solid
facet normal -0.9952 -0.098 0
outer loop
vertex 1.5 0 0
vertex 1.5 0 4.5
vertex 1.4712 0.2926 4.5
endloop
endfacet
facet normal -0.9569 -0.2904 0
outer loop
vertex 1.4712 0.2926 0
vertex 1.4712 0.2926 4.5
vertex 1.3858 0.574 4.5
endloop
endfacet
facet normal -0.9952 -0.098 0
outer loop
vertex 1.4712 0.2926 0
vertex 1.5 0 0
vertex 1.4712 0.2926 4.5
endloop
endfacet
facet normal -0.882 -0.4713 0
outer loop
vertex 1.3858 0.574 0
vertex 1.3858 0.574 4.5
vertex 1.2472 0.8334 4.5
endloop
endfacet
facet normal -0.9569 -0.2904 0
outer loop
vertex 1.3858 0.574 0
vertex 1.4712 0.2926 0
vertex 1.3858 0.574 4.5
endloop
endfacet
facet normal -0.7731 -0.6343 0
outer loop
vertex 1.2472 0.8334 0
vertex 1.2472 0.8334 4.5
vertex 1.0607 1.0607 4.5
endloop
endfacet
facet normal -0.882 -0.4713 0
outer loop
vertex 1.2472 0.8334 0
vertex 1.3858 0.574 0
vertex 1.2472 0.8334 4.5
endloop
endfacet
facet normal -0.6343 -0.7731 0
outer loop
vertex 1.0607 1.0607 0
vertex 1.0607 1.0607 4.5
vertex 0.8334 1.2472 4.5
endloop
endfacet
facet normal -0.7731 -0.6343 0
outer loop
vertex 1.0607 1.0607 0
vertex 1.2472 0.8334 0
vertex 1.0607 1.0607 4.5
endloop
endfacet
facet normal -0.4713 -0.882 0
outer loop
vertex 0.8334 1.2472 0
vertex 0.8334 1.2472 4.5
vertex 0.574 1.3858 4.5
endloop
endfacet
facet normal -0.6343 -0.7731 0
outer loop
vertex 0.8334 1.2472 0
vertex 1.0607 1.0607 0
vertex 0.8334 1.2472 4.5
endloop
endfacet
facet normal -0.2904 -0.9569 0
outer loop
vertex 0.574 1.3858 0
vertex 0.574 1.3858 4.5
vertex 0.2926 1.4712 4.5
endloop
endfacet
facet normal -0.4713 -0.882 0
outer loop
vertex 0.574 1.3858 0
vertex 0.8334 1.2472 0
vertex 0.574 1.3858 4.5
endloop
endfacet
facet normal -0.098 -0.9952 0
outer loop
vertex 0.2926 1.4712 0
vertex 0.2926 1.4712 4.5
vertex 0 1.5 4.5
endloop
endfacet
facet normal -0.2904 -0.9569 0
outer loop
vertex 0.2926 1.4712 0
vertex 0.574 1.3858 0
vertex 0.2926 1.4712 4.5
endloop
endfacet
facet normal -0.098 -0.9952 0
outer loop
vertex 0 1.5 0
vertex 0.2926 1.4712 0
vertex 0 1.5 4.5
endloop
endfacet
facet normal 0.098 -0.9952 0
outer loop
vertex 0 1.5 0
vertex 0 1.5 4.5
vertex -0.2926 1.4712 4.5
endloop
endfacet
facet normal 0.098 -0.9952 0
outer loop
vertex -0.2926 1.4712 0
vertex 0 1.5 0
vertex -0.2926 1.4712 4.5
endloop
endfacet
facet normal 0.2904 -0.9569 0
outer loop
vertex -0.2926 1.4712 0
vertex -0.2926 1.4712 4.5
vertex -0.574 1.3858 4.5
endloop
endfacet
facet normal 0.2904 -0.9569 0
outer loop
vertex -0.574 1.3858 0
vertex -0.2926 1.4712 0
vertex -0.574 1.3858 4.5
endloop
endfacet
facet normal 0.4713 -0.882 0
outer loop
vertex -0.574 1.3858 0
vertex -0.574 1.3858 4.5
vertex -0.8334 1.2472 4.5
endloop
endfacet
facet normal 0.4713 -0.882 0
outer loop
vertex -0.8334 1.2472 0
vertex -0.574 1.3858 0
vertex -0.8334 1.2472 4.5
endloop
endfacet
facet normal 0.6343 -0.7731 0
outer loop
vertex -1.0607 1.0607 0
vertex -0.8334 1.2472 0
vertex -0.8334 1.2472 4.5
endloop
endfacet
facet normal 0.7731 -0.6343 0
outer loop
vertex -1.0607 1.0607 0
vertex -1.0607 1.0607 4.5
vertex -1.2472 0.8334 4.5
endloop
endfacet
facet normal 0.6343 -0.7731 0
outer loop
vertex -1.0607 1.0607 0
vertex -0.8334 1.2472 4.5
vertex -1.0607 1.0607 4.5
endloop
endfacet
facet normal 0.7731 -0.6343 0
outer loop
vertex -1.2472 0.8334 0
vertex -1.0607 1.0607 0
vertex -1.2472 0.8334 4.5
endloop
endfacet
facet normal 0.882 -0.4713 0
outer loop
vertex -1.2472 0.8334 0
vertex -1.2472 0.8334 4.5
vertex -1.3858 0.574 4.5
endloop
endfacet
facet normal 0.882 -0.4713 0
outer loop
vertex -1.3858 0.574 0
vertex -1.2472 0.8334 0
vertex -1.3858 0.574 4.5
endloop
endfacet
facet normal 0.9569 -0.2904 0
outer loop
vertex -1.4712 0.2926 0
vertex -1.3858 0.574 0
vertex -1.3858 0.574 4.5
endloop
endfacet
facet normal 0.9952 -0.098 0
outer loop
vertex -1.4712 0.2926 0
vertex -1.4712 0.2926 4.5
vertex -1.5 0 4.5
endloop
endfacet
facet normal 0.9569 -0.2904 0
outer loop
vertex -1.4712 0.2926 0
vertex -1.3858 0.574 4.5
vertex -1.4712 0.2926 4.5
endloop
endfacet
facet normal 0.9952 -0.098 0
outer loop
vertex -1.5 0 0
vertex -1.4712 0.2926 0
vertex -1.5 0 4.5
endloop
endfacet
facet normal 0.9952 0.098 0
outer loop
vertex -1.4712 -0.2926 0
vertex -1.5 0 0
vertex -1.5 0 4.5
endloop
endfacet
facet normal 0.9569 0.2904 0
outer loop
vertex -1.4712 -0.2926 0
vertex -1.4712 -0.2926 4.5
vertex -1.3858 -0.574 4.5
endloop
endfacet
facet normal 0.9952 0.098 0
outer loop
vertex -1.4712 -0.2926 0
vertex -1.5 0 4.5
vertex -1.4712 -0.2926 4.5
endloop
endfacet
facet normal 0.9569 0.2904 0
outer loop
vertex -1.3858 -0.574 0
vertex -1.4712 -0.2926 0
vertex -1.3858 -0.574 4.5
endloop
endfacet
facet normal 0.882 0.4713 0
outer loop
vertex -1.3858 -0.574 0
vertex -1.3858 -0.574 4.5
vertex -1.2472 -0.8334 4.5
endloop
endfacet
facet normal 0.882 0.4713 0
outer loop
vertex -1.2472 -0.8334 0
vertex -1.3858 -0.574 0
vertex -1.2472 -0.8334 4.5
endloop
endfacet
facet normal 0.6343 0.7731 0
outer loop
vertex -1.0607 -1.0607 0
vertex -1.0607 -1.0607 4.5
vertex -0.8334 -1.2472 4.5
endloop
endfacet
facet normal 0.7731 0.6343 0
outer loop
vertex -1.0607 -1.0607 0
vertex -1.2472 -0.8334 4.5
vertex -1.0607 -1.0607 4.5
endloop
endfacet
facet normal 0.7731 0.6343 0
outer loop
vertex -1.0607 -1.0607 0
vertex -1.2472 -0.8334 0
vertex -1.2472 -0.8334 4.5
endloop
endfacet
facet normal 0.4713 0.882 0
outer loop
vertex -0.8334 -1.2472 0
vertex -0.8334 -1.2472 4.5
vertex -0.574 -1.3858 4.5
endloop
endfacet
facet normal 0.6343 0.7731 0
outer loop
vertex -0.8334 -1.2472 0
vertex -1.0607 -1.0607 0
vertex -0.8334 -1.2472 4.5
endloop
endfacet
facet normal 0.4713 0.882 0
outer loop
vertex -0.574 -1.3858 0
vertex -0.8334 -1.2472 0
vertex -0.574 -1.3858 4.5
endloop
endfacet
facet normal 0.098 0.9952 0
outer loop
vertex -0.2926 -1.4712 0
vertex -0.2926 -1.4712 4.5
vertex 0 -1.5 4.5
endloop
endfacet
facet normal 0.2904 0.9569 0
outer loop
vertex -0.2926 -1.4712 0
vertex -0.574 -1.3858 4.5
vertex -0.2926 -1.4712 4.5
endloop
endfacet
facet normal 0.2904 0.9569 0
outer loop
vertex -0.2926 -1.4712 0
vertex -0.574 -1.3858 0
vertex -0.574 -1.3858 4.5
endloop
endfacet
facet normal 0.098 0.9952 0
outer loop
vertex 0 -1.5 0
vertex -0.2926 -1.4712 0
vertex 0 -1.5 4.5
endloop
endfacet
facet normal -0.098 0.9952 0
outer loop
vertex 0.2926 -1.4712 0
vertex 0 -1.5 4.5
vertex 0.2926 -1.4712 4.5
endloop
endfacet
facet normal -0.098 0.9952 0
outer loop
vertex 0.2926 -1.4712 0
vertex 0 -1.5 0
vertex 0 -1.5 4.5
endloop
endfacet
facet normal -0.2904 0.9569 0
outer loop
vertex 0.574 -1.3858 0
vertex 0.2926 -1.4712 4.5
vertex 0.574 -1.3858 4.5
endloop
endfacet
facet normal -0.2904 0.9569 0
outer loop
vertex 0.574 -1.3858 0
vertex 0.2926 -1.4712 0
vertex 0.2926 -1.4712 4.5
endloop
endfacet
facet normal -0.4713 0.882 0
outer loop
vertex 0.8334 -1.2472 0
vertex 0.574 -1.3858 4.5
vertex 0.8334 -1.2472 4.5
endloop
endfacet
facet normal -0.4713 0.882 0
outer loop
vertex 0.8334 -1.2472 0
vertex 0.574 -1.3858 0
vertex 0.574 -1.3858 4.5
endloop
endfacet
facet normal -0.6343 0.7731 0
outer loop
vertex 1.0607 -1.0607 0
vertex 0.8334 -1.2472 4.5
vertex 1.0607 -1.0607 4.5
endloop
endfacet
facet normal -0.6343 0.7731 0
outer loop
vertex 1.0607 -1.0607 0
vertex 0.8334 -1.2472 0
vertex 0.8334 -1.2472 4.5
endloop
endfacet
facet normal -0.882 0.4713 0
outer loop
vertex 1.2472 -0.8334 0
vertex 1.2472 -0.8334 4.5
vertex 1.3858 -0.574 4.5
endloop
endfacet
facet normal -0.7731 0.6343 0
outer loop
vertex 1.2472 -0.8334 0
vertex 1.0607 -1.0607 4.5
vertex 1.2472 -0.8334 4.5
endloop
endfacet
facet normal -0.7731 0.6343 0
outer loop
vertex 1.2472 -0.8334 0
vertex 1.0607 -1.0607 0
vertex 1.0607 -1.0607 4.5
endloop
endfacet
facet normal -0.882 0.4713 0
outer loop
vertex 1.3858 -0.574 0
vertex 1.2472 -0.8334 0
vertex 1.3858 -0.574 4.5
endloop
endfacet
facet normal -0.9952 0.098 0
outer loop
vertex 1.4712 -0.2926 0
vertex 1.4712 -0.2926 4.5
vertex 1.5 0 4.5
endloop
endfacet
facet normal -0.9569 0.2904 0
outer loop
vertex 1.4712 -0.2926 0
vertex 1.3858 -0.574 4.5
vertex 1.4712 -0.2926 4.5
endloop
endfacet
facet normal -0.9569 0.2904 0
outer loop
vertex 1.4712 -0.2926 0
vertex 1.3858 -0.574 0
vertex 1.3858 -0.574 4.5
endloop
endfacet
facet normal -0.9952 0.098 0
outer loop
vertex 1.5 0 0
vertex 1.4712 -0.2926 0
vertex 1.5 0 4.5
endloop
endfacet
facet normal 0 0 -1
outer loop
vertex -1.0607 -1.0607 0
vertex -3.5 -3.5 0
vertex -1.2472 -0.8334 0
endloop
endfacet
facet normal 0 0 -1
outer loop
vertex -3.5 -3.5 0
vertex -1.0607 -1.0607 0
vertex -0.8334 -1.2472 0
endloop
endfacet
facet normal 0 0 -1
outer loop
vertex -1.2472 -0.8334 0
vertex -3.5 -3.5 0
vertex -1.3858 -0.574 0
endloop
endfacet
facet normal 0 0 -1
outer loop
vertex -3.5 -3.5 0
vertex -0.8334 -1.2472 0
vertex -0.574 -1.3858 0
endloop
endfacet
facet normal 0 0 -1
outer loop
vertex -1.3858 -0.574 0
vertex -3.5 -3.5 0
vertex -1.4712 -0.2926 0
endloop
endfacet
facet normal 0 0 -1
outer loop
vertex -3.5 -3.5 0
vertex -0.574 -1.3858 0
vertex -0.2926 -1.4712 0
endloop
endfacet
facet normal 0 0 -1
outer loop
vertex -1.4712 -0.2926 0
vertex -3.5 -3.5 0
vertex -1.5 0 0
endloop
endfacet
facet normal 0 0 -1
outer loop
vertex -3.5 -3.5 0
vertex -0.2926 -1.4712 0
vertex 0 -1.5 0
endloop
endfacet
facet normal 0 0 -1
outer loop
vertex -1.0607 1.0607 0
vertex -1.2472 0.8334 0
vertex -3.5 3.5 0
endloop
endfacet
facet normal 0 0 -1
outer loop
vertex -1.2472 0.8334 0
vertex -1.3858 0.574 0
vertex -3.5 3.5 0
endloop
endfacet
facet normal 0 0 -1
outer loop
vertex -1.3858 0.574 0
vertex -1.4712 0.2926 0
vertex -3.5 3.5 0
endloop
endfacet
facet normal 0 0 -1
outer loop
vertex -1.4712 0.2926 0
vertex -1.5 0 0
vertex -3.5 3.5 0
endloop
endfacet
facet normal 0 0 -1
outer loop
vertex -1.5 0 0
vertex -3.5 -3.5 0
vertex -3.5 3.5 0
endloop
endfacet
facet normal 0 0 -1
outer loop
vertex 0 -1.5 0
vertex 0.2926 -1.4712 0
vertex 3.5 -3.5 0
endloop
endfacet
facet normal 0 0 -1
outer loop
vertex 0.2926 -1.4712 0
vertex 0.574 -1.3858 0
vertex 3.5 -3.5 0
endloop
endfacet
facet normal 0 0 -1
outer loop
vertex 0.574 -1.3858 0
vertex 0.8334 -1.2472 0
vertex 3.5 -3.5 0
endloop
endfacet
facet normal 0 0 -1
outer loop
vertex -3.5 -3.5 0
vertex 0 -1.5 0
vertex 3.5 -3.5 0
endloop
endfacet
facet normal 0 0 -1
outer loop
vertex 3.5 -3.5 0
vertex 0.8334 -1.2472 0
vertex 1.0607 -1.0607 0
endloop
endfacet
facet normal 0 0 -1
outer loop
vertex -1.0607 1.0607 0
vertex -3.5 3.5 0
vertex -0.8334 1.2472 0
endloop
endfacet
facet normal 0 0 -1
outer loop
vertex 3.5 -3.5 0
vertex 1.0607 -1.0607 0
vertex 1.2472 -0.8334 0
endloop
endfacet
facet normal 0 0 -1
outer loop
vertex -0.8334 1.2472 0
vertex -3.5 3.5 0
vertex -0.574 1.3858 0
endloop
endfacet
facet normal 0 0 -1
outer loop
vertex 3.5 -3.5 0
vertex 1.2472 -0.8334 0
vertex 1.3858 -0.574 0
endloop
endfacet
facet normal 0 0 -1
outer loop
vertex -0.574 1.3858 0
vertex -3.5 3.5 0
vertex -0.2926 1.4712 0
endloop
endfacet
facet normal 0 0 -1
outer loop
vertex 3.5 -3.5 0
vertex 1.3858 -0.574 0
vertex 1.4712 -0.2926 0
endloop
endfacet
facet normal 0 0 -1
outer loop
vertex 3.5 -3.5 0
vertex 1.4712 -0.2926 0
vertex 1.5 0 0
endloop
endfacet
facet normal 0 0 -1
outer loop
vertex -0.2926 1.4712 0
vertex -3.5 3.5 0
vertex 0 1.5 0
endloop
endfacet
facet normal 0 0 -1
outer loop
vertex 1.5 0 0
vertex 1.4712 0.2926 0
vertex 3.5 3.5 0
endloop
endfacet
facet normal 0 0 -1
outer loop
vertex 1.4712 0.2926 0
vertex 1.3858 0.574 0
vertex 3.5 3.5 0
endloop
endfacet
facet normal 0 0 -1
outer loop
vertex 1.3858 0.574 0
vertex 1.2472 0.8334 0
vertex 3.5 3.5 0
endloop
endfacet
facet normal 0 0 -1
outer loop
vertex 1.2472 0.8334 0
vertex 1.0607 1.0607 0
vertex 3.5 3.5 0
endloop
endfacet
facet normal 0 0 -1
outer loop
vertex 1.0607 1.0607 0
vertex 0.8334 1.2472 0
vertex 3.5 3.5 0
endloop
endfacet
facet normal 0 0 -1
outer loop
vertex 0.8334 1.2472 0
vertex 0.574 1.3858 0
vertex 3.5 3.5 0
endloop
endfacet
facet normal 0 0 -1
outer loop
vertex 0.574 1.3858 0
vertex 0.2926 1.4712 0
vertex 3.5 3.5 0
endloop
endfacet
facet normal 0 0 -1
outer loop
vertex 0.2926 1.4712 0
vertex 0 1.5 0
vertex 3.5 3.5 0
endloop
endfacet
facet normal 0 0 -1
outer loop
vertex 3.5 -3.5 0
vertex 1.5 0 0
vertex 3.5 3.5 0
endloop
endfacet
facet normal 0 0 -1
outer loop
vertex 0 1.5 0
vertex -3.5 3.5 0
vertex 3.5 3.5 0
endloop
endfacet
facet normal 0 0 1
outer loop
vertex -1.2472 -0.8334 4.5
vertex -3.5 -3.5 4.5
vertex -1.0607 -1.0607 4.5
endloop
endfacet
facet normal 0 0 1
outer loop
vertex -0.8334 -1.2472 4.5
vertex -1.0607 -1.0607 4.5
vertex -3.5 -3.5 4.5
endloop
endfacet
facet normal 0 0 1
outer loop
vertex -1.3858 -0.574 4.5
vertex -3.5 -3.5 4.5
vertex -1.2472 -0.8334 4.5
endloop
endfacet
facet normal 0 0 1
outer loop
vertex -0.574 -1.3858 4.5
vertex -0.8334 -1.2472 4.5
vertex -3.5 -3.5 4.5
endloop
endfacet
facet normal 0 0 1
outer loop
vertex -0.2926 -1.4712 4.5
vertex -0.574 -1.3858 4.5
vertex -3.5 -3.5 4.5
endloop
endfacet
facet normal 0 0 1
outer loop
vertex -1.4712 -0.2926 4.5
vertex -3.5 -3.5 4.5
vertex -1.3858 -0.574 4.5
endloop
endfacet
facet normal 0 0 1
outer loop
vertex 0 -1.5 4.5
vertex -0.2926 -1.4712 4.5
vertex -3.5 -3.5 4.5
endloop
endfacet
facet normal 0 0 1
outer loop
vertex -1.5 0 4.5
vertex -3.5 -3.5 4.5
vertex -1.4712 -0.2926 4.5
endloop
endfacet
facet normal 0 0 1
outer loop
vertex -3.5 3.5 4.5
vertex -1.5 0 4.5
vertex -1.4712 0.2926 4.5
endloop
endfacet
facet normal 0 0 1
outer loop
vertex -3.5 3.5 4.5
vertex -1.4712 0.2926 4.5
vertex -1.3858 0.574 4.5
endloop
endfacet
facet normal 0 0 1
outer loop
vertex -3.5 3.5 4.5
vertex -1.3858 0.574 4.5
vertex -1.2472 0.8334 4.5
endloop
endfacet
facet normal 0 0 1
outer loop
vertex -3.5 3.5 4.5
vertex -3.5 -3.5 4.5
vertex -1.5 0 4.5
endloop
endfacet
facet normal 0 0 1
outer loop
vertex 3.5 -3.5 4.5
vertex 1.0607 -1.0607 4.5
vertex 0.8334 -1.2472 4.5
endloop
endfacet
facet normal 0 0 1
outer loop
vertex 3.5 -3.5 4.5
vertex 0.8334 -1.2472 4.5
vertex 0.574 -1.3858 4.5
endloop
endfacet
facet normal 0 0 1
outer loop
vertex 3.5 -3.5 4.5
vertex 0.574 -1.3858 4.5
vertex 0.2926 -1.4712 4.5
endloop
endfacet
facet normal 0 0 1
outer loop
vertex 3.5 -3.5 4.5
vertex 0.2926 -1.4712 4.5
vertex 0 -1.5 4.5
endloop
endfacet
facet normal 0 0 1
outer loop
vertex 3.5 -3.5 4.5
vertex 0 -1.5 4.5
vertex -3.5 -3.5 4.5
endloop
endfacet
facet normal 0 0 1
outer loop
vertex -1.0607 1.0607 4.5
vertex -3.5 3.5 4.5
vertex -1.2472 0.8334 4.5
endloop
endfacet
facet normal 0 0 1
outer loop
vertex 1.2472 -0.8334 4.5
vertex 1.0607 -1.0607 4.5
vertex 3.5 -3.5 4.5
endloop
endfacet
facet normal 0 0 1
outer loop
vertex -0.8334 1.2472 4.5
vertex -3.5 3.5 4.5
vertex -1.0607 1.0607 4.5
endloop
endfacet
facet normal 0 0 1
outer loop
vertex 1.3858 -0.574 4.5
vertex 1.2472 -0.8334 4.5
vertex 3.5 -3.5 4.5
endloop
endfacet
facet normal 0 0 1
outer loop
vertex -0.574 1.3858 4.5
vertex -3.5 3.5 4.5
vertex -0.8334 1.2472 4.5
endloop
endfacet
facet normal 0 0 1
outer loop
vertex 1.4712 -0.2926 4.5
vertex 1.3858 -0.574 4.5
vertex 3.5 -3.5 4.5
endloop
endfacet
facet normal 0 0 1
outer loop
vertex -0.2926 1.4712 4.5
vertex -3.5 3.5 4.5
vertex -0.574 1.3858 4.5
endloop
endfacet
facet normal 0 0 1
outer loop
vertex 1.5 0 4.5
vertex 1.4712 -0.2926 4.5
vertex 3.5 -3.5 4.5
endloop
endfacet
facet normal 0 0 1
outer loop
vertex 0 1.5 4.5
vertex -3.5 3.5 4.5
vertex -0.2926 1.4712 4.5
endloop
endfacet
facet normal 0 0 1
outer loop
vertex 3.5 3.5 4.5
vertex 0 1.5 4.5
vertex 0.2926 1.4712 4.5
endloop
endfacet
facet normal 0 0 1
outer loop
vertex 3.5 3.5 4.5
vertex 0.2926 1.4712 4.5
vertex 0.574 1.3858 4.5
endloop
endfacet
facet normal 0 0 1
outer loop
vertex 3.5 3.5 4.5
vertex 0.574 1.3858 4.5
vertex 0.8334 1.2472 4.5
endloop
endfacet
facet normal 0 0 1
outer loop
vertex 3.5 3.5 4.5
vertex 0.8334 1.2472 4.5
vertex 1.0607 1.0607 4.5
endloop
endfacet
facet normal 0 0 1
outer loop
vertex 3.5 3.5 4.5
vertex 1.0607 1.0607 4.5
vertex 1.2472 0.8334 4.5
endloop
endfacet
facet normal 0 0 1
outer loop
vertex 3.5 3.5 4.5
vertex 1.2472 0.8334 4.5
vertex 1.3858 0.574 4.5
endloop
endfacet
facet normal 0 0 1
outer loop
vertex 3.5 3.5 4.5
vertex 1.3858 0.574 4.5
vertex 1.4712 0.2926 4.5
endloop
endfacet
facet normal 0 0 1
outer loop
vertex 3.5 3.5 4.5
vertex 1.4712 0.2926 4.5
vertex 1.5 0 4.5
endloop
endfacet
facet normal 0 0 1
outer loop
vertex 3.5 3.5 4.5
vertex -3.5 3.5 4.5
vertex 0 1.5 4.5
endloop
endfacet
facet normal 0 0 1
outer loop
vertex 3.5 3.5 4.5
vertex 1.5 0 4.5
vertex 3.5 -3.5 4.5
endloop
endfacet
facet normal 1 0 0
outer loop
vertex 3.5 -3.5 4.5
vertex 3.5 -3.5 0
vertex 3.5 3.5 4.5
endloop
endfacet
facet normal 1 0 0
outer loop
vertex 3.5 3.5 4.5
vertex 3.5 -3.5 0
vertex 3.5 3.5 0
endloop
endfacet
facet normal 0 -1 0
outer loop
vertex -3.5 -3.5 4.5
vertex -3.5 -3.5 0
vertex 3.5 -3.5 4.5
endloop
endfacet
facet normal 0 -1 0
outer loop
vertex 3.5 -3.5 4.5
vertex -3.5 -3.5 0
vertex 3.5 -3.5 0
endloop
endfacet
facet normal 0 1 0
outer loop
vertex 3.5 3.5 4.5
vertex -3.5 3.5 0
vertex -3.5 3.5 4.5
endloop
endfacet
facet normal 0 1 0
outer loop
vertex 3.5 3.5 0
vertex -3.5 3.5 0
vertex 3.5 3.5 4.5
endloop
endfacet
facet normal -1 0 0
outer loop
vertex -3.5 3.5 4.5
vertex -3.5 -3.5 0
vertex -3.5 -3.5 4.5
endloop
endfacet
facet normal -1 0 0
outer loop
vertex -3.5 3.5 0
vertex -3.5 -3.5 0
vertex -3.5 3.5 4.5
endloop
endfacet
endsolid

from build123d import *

# Parameters (mm, degrees)
CYLINDER_R     = 1.5
CYLINDER_DEPTH = 10
BOX008_W       = 7
BOX008_H       = 7
BOX008_DEPTH   = 4.5


with BuildPart() as hole:
    # Cylinder → Cylinder (new body)
    with BuildSketch(Plane.XY):
        Circle(CYLINDER_R)
    extrude(amount=CYLINDER_DEPTH)


with BuildPart() as stand_hole_cut:
    # Box008 → Box008 (new body)
    with BuildSketch(Plane(origin=(-3.5, -3.5, 0), x_dir=(1, 0, 0), z_dir=(0, 0, 1))):
        with Locations((3.5, 3.5)):
            Rectangle(BOX008_W, BOX008_H)
    extrude(amount=BOX008_DEPTH)

    # Cut003002: cut hole
    add(hole.part, mode=Mode.SUBTRACT)


solid = stand_hole_cut.part
